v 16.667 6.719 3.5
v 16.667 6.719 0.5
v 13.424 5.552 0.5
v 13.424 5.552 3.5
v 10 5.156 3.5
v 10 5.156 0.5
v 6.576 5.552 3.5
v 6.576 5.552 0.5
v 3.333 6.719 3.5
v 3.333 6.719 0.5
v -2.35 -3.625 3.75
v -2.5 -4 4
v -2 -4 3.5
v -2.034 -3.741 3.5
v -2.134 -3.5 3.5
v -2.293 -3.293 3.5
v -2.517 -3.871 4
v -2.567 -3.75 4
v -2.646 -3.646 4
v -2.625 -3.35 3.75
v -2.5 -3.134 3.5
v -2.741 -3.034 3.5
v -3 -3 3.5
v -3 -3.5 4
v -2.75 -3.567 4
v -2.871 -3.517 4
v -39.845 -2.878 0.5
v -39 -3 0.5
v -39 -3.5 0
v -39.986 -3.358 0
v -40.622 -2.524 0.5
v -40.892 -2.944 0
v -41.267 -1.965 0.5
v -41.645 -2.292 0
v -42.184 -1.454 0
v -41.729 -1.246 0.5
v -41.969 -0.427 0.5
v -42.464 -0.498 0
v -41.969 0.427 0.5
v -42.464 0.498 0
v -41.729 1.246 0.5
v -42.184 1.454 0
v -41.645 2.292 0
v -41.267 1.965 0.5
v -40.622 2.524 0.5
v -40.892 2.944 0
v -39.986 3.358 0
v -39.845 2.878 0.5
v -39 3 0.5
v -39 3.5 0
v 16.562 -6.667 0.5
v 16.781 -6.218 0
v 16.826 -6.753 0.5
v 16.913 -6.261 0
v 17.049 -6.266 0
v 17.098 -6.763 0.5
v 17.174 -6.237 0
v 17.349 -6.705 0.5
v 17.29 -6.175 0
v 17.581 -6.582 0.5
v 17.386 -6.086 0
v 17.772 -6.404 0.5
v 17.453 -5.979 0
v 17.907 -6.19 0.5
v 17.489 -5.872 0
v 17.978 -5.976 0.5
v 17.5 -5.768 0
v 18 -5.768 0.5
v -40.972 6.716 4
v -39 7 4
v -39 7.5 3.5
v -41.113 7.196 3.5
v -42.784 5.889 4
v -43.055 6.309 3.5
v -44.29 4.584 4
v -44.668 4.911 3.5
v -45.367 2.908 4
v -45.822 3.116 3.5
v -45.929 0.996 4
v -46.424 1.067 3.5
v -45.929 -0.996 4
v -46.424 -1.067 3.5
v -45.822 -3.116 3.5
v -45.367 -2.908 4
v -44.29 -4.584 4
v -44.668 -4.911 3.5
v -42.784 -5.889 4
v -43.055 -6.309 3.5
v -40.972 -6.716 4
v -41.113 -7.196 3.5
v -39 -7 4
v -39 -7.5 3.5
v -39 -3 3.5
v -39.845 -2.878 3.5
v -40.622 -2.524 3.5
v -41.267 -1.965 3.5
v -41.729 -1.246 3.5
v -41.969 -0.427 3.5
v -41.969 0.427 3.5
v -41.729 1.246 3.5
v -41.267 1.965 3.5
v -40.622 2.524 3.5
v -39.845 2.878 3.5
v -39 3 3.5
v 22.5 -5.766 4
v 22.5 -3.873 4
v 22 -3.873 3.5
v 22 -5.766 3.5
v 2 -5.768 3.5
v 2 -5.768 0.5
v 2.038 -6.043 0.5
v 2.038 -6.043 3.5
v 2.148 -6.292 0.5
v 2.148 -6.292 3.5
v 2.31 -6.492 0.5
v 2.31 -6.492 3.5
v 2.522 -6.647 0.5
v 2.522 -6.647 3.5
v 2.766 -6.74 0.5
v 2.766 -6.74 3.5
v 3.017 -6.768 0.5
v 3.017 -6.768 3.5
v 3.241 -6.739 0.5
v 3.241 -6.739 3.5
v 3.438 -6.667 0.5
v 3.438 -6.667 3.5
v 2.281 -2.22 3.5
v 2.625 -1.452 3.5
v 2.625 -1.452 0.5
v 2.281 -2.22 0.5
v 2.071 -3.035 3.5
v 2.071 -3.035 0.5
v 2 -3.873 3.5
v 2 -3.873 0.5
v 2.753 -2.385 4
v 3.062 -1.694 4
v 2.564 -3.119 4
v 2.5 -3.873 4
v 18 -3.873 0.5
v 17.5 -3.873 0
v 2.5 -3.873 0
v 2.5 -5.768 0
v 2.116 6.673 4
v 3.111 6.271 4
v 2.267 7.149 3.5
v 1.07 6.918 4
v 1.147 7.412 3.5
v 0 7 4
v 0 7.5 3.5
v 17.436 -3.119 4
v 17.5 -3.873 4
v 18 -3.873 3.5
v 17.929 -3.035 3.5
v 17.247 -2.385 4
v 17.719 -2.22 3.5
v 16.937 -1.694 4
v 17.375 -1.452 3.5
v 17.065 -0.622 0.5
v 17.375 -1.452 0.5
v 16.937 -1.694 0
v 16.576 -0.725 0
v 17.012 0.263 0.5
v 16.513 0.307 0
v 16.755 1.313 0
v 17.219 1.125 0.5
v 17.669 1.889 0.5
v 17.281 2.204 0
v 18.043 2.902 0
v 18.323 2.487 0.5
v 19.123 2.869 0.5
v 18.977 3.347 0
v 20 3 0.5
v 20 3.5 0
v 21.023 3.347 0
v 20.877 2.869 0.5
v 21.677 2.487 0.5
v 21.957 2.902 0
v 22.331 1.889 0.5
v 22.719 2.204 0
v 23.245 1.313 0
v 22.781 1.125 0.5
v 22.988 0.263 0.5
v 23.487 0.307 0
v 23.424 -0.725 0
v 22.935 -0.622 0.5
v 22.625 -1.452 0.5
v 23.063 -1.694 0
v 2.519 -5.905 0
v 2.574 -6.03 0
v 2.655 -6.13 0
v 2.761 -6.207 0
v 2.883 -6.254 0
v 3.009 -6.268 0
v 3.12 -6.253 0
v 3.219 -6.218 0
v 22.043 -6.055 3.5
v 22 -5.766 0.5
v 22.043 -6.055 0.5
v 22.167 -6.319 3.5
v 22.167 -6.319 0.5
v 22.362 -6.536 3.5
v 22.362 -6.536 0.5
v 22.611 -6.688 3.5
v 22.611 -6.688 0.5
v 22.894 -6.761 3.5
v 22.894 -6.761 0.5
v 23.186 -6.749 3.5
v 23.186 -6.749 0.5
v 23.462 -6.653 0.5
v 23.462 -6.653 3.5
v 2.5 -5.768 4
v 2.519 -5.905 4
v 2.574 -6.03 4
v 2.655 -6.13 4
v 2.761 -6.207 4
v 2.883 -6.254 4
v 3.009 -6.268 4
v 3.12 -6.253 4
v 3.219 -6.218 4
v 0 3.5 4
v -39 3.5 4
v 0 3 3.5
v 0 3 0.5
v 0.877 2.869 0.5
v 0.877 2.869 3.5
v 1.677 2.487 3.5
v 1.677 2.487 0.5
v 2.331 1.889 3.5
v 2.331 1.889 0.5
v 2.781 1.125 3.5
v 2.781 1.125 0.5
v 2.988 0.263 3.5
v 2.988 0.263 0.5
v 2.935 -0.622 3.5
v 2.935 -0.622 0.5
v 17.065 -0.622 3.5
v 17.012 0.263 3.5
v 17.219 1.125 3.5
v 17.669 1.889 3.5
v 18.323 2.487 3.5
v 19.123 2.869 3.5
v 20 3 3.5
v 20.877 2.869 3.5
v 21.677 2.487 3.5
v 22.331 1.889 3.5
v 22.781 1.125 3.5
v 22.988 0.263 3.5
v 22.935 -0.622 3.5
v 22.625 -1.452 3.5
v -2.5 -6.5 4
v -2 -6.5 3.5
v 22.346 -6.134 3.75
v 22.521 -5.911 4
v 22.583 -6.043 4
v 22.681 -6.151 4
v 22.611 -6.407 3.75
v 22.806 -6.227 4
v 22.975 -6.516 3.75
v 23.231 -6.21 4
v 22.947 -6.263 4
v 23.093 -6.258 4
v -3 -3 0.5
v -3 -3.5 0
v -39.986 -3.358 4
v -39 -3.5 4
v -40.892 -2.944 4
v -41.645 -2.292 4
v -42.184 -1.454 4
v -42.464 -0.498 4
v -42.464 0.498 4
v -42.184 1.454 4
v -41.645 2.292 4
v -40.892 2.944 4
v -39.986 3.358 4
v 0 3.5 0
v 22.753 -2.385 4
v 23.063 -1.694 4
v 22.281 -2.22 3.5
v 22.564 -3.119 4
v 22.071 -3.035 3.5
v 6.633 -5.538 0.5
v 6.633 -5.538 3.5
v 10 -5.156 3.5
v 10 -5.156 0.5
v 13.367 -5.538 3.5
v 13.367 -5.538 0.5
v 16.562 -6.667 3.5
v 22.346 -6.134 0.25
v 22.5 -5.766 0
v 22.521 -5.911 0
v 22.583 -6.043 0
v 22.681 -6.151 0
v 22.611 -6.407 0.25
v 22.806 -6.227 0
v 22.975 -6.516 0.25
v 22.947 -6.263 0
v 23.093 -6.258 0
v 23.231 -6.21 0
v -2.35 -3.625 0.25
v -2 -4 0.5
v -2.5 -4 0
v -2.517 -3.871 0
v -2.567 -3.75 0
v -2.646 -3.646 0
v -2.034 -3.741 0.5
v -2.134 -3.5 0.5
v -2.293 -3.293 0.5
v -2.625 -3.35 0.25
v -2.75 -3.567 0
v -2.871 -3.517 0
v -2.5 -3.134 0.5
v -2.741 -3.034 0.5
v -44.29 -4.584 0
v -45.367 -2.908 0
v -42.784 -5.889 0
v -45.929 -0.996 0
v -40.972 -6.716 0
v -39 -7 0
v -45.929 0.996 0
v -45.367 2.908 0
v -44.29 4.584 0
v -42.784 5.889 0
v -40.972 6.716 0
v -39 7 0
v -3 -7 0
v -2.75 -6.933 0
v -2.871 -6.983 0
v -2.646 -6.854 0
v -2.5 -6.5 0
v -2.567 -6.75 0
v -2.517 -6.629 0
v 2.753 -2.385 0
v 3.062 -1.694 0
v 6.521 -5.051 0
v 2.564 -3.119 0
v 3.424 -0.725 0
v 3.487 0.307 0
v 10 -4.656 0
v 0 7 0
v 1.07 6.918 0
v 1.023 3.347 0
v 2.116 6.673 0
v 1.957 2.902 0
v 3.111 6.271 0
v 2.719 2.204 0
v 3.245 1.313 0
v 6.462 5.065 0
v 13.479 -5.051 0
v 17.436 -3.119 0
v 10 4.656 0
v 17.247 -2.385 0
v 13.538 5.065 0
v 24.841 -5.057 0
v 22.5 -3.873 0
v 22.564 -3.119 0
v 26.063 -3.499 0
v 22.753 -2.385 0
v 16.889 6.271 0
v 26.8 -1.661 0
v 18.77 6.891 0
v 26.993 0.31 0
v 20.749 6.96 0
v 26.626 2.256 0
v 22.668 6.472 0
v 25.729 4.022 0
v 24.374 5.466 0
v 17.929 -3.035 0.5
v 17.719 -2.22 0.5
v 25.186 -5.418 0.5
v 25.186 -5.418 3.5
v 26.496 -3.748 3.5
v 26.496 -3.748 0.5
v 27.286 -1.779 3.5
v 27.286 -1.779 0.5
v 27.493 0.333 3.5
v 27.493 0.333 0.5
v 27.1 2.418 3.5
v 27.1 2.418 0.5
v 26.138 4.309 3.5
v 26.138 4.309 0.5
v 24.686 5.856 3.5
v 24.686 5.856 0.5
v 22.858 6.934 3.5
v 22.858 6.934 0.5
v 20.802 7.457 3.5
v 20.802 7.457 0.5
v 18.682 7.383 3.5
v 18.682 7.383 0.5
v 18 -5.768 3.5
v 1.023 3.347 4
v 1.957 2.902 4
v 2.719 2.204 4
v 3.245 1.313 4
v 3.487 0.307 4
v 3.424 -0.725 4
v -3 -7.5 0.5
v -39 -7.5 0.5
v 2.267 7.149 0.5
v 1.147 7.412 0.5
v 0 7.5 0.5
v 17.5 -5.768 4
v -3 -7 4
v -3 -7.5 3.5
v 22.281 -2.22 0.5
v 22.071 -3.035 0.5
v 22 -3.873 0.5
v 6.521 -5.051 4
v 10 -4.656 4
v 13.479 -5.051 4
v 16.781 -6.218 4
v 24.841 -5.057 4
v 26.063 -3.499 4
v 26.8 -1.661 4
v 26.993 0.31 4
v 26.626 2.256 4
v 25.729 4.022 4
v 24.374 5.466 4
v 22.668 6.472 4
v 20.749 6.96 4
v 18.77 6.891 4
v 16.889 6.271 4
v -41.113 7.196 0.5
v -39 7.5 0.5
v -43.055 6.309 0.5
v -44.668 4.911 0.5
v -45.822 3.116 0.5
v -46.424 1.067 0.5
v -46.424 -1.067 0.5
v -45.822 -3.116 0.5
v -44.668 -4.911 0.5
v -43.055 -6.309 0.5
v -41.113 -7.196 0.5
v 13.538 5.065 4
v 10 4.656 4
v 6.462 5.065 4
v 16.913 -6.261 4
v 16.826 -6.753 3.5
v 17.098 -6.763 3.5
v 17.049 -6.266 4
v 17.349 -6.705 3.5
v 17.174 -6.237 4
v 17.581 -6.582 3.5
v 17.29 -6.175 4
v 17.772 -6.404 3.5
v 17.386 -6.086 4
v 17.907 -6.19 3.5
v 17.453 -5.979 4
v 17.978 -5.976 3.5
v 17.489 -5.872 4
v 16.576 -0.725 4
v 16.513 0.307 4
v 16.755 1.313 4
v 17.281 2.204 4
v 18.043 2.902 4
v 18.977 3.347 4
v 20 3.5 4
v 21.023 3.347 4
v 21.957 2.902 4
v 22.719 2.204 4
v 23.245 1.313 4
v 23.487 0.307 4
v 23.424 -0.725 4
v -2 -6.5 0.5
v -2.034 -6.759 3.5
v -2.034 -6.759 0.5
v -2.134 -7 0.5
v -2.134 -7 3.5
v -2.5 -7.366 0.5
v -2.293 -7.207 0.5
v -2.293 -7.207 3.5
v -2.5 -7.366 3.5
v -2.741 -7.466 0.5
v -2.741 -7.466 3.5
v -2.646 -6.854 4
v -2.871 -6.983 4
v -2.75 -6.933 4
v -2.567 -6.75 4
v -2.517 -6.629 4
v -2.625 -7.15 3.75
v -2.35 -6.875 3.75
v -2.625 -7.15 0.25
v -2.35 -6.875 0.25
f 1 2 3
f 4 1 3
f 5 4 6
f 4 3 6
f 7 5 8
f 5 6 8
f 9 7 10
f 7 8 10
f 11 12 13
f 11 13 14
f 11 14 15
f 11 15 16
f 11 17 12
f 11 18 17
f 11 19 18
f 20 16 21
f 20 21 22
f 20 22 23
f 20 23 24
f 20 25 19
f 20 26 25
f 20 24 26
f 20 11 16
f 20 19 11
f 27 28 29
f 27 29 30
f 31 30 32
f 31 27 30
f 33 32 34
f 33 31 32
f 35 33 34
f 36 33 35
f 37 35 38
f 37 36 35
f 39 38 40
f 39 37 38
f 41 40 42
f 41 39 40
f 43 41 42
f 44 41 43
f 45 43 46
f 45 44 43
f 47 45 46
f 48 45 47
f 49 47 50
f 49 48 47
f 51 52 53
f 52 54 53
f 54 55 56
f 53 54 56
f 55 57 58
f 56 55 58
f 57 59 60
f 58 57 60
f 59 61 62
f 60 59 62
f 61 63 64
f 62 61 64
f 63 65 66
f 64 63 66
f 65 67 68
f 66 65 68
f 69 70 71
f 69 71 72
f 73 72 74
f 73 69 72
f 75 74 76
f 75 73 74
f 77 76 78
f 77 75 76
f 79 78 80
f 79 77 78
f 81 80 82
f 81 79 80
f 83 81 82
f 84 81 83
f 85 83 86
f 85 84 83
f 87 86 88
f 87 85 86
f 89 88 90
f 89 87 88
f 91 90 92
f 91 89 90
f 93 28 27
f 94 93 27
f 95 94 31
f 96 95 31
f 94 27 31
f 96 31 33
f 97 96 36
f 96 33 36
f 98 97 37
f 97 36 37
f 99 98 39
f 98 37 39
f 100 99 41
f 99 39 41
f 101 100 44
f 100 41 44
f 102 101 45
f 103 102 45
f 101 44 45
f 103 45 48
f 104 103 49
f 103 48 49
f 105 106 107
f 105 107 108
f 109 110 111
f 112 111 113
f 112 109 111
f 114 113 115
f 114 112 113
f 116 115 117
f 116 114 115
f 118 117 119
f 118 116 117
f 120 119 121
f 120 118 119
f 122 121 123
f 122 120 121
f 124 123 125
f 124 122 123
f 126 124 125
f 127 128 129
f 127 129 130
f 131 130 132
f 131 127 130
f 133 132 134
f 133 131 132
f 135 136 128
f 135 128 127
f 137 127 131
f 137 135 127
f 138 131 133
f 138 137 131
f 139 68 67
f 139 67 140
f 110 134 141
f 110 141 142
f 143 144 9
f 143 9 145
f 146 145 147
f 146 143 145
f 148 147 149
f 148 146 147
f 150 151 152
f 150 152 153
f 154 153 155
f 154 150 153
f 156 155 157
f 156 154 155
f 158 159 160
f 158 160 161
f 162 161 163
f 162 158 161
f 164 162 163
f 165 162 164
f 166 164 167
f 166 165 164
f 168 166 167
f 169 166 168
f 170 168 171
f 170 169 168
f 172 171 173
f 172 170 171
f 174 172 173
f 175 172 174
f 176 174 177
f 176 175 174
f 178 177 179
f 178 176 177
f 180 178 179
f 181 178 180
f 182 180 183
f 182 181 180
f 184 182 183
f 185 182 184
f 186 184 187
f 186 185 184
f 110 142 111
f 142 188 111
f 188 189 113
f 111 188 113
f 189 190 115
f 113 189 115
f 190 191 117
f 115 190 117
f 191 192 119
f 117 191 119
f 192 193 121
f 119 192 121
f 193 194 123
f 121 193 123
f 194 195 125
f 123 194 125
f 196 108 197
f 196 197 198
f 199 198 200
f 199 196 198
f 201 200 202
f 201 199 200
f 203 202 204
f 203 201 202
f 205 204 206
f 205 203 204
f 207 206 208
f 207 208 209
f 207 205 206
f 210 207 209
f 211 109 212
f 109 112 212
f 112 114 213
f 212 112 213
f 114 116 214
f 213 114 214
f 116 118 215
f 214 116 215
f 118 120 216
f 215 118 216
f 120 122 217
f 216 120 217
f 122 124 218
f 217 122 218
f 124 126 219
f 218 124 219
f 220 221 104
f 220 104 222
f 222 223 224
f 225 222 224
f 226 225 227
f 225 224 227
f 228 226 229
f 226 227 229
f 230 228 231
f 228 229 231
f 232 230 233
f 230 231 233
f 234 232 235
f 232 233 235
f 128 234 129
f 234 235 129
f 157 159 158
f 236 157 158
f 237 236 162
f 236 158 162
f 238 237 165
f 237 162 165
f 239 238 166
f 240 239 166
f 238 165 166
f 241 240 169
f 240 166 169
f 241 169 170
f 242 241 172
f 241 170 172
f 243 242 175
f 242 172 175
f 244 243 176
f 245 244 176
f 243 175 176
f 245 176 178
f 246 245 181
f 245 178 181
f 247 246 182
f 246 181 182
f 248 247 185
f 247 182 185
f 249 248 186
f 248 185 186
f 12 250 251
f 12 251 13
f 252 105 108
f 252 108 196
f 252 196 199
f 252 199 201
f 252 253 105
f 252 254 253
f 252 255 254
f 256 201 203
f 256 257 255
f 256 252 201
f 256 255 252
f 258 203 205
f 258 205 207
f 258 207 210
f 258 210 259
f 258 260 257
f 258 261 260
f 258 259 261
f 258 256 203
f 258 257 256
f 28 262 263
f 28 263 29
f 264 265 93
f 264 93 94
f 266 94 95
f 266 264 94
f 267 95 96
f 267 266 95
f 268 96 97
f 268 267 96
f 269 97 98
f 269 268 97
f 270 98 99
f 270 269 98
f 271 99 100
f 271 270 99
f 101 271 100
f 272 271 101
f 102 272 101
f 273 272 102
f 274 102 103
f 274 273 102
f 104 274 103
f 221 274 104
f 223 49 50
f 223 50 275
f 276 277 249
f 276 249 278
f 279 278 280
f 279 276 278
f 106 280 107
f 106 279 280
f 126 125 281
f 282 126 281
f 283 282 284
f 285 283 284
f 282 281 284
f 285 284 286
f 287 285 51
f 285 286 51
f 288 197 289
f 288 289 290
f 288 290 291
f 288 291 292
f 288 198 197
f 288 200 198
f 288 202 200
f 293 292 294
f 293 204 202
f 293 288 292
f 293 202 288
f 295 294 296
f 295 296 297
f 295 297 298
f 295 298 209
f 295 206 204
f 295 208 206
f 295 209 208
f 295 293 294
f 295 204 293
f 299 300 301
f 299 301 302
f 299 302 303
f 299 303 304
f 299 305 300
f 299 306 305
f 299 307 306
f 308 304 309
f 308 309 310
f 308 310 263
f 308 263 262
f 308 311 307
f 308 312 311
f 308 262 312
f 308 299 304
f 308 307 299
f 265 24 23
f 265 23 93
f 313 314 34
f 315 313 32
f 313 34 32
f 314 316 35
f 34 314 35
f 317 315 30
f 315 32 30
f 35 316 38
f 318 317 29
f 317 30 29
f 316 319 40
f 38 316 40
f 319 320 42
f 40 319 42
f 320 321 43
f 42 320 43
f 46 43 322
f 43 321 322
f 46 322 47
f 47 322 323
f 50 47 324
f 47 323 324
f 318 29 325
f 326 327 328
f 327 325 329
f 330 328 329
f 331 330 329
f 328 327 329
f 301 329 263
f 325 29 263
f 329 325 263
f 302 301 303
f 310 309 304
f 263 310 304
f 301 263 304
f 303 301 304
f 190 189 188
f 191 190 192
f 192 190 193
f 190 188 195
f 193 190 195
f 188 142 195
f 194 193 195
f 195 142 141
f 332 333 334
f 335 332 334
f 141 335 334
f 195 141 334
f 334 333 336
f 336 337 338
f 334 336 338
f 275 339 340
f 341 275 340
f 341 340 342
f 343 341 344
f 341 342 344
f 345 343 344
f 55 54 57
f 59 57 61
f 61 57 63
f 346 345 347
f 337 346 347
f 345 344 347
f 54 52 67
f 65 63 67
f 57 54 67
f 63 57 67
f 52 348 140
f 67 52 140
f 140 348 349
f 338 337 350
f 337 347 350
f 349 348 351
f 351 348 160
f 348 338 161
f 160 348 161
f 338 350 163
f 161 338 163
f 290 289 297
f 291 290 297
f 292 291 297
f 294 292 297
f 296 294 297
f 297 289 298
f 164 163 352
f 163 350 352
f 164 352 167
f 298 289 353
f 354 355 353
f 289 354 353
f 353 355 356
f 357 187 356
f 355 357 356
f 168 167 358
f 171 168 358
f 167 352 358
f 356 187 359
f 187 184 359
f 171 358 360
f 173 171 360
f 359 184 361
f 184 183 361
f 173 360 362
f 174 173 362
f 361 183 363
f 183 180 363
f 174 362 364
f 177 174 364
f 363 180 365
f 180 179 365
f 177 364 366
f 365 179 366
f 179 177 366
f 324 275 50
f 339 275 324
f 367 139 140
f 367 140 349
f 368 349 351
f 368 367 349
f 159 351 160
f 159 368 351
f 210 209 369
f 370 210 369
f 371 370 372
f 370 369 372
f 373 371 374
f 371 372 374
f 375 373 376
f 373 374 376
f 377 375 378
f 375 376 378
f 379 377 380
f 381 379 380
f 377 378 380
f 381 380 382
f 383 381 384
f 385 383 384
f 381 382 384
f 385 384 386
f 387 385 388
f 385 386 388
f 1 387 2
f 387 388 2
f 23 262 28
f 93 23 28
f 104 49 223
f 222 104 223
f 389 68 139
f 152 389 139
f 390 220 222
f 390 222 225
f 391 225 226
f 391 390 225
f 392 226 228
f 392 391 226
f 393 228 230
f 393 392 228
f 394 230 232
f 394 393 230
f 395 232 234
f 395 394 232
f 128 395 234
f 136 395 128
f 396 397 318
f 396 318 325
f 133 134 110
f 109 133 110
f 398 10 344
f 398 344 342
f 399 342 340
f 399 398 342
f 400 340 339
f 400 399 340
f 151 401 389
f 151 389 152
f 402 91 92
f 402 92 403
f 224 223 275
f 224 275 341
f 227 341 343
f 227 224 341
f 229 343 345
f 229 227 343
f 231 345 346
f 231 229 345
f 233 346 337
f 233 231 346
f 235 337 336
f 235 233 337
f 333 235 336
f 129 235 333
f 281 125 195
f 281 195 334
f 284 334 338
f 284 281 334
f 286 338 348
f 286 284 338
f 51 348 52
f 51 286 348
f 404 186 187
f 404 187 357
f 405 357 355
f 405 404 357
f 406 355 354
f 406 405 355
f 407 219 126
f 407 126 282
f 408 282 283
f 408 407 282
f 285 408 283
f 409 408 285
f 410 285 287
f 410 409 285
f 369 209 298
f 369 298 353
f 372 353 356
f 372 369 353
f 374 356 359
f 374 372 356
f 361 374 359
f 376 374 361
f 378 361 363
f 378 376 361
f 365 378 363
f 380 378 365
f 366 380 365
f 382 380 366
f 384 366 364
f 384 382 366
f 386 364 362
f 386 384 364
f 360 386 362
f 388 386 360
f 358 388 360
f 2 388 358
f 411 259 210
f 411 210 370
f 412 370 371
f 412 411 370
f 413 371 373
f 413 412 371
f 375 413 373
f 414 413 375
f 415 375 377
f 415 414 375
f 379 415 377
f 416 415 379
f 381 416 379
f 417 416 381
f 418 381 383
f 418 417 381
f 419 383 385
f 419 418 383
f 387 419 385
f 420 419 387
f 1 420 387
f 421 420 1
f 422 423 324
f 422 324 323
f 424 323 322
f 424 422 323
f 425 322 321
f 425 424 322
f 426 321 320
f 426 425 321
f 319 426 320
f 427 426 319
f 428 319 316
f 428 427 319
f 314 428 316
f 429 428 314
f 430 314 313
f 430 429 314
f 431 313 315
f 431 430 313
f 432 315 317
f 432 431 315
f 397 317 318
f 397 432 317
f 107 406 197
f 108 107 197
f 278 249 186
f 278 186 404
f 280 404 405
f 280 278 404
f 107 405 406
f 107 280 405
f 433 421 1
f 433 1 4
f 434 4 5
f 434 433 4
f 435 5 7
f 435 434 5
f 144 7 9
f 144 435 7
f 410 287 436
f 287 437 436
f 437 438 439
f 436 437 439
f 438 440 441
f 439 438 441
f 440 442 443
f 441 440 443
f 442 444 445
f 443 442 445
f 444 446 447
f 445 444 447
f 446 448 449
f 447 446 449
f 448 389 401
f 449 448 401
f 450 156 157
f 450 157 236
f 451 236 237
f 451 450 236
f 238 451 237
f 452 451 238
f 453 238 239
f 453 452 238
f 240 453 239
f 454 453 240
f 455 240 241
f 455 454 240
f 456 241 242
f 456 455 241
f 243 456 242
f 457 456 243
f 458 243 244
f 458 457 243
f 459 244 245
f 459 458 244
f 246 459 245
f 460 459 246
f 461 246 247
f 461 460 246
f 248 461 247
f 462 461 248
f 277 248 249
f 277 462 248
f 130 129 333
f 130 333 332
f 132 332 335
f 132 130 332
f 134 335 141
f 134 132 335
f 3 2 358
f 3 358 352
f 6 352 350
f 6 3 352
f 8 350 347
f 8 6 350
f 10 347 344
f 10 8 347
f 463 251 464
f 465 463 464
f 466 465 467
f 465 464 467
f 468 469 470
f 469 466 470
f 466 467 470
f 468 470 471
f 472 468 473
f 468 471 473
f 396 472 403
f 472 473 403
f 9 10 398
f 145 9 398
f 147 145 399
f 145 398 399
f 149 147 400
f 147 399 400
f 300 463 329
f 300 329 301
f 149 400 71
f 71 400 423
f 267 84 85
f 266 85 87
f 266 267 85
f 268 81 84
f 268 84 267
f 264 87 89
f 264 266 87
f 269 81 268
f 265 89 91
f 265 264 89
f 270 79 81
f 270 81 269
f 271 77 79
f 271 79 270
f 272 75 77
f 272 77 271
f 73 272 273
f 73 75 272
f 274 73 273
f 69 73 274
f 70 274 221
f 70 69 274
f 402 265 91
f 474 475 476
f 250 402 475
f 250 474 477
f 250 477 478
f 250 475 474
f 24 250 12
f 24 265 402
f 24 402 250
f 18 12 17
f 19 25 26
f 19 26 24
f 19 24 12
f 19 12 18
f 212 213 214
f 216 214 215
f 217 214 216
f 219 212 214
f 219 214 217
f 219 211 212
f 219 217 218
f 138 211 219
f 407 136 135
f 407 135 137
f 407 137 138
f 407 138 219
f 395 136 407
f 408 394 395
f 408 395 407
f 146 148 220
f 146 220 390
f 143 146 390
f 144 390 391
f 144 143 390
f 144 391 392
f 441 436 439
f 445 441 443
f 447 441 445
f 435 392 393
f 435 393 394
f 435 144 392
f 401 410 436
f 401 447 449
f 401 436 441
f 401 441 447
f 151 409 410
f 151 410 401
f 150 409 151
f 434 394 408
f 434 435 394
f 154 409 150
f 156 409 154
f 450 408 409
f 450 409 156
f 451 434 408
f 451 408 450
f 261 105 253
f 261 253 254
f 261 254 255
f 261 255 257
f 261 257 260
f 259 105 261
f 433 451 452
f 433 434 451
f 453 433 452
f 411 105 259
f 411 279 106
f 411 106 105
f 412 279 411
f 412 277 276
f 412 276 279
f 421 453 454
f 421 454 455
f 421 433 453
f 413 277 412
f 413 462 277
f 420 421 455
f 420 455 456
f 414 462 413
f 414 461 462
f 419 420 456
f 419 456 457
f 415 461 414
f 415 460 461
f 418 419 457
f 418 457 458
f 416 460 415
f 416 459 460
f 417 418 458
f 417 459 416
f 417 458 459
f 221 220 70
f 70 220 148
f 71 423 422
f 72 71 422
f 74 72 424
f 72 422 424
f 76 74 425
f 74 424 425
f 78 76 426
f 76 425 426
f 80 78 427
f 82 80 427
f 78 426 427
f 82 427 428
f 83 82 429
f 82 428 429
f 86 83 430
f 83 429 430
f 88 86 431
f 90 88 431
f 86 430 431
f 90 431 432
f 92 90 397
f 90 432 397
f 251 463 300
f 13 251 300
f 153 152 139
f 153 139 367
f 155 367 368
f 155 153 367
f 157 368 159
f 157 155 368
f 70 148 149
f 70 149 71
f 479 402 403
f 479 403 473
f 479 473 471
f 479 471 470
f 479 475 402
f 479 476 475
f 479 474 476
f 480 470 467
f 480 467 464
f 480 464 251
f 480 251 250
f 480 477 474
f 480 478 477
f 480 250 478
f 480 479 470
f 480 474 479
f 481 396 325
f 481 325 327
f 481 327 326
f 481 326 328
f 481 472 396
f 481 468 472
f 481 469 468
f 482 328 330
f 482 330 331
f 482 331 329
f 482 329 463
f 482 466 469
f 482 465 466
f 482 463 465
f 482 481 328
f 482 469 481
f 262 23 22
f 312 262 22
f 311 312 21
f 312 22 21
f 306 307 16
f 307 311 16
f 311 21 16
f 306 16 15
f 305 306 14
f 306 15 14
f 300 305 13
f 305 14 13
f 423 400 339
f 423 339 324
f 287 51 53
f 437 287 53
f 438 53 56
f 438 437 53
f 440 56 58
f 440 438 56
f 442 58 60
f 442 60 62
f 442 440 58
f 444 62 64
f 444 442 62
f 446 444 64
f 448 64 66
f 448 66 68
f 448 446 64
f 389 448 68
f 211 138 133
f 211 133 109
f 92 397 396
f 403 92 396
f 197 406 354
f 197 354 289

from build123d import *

# Parameters (mm, degrees)
F1_DEPTH = 4
F2_R     = 5
F3_R     = 1
F4_SIZE  = 0.5


with BuildPart() as f1:
    # F0 (on Top) → F1 (new body)
    with BuildSketch(Plane.XY):
        with BuildLine():
            ThreePointArc((0, 3), (2.802517, 1.070466), (2, -2.236068))
            Line((2, -2.236068), (2, -7.228416))
            ThreePointArc((2, -7.228416), (2.678825, -7.005276), (3.333333, -6.718548))
            ThreePointArc((3.333333, -6.718548), (10, -5.155644), (16.666667, -6.718548))
            ThreePointArc((16.666667, -6.718548), (17.321175, -7.005276), (18, -7.228416))
            Line((18, -7.228416), (18, -2.236068))
            ThreePointArc((18, -2.236068), (20, 3), (22, -2.236068))
            Line((22, -2.236068), (22, -7.228416))
            ThreePointArc((22, -7.228416), (27.005276, 2.678825), (16.666667, 6.718548))
            ThreePointArc((16.666667, 6.718548), (10, 5.155644), (3.333333, 6.718548))
            ThreePointArc((3.333333, 6.718548), (1.711854, 7.302024), (0, 7.5))
            Line((0, 7.5), (-39, 7.5))
            ThreePointArc((-39, 7.5), (-46.5, 0), (-39, -7.5))
            Line((-39, -7.5), (-2, -7.5))
            Line((-2, -7.5), (-2, -3))
            Line((-2, -3), (-39, -3))
            ThreePointArc((-39, -3), (-42, 0), (-39, 3))
            Line((-39, 3), (0, 3))
        make_face()
    extrude(amount=F1_DEPTH)

    # F2
    f2_edges = [f1.edges().sort_by_distance(p)[0] for p in [
        (2, -2.236068, 2),
        (18, -2.236068, 2),
        (22, -2.236068, 2),
    ]]
    fillet(f2_edges, radius=F2_R)

    # F3
    f3_edges = [f1.edges().sort_by_distance(p)[0] for p in [
        (-2, -3, 2),
        (2, -7.228416, 2),
        (-2, -7.5, 2),
        (18, -7.228416, 2),
        (22, -7.228416, 2),
    ]]
    fillet(f3_edges, radius=F3_R)

    # F4
    f4_edges = [f1.edges().sort_by_distance(p)[0] for p in [
        (-21, -7.5, 4),
        (-21, -7.5, 0),
    ]]
    chamfer(f4_edges, length=F4_SIZE)


solid = f1.part
